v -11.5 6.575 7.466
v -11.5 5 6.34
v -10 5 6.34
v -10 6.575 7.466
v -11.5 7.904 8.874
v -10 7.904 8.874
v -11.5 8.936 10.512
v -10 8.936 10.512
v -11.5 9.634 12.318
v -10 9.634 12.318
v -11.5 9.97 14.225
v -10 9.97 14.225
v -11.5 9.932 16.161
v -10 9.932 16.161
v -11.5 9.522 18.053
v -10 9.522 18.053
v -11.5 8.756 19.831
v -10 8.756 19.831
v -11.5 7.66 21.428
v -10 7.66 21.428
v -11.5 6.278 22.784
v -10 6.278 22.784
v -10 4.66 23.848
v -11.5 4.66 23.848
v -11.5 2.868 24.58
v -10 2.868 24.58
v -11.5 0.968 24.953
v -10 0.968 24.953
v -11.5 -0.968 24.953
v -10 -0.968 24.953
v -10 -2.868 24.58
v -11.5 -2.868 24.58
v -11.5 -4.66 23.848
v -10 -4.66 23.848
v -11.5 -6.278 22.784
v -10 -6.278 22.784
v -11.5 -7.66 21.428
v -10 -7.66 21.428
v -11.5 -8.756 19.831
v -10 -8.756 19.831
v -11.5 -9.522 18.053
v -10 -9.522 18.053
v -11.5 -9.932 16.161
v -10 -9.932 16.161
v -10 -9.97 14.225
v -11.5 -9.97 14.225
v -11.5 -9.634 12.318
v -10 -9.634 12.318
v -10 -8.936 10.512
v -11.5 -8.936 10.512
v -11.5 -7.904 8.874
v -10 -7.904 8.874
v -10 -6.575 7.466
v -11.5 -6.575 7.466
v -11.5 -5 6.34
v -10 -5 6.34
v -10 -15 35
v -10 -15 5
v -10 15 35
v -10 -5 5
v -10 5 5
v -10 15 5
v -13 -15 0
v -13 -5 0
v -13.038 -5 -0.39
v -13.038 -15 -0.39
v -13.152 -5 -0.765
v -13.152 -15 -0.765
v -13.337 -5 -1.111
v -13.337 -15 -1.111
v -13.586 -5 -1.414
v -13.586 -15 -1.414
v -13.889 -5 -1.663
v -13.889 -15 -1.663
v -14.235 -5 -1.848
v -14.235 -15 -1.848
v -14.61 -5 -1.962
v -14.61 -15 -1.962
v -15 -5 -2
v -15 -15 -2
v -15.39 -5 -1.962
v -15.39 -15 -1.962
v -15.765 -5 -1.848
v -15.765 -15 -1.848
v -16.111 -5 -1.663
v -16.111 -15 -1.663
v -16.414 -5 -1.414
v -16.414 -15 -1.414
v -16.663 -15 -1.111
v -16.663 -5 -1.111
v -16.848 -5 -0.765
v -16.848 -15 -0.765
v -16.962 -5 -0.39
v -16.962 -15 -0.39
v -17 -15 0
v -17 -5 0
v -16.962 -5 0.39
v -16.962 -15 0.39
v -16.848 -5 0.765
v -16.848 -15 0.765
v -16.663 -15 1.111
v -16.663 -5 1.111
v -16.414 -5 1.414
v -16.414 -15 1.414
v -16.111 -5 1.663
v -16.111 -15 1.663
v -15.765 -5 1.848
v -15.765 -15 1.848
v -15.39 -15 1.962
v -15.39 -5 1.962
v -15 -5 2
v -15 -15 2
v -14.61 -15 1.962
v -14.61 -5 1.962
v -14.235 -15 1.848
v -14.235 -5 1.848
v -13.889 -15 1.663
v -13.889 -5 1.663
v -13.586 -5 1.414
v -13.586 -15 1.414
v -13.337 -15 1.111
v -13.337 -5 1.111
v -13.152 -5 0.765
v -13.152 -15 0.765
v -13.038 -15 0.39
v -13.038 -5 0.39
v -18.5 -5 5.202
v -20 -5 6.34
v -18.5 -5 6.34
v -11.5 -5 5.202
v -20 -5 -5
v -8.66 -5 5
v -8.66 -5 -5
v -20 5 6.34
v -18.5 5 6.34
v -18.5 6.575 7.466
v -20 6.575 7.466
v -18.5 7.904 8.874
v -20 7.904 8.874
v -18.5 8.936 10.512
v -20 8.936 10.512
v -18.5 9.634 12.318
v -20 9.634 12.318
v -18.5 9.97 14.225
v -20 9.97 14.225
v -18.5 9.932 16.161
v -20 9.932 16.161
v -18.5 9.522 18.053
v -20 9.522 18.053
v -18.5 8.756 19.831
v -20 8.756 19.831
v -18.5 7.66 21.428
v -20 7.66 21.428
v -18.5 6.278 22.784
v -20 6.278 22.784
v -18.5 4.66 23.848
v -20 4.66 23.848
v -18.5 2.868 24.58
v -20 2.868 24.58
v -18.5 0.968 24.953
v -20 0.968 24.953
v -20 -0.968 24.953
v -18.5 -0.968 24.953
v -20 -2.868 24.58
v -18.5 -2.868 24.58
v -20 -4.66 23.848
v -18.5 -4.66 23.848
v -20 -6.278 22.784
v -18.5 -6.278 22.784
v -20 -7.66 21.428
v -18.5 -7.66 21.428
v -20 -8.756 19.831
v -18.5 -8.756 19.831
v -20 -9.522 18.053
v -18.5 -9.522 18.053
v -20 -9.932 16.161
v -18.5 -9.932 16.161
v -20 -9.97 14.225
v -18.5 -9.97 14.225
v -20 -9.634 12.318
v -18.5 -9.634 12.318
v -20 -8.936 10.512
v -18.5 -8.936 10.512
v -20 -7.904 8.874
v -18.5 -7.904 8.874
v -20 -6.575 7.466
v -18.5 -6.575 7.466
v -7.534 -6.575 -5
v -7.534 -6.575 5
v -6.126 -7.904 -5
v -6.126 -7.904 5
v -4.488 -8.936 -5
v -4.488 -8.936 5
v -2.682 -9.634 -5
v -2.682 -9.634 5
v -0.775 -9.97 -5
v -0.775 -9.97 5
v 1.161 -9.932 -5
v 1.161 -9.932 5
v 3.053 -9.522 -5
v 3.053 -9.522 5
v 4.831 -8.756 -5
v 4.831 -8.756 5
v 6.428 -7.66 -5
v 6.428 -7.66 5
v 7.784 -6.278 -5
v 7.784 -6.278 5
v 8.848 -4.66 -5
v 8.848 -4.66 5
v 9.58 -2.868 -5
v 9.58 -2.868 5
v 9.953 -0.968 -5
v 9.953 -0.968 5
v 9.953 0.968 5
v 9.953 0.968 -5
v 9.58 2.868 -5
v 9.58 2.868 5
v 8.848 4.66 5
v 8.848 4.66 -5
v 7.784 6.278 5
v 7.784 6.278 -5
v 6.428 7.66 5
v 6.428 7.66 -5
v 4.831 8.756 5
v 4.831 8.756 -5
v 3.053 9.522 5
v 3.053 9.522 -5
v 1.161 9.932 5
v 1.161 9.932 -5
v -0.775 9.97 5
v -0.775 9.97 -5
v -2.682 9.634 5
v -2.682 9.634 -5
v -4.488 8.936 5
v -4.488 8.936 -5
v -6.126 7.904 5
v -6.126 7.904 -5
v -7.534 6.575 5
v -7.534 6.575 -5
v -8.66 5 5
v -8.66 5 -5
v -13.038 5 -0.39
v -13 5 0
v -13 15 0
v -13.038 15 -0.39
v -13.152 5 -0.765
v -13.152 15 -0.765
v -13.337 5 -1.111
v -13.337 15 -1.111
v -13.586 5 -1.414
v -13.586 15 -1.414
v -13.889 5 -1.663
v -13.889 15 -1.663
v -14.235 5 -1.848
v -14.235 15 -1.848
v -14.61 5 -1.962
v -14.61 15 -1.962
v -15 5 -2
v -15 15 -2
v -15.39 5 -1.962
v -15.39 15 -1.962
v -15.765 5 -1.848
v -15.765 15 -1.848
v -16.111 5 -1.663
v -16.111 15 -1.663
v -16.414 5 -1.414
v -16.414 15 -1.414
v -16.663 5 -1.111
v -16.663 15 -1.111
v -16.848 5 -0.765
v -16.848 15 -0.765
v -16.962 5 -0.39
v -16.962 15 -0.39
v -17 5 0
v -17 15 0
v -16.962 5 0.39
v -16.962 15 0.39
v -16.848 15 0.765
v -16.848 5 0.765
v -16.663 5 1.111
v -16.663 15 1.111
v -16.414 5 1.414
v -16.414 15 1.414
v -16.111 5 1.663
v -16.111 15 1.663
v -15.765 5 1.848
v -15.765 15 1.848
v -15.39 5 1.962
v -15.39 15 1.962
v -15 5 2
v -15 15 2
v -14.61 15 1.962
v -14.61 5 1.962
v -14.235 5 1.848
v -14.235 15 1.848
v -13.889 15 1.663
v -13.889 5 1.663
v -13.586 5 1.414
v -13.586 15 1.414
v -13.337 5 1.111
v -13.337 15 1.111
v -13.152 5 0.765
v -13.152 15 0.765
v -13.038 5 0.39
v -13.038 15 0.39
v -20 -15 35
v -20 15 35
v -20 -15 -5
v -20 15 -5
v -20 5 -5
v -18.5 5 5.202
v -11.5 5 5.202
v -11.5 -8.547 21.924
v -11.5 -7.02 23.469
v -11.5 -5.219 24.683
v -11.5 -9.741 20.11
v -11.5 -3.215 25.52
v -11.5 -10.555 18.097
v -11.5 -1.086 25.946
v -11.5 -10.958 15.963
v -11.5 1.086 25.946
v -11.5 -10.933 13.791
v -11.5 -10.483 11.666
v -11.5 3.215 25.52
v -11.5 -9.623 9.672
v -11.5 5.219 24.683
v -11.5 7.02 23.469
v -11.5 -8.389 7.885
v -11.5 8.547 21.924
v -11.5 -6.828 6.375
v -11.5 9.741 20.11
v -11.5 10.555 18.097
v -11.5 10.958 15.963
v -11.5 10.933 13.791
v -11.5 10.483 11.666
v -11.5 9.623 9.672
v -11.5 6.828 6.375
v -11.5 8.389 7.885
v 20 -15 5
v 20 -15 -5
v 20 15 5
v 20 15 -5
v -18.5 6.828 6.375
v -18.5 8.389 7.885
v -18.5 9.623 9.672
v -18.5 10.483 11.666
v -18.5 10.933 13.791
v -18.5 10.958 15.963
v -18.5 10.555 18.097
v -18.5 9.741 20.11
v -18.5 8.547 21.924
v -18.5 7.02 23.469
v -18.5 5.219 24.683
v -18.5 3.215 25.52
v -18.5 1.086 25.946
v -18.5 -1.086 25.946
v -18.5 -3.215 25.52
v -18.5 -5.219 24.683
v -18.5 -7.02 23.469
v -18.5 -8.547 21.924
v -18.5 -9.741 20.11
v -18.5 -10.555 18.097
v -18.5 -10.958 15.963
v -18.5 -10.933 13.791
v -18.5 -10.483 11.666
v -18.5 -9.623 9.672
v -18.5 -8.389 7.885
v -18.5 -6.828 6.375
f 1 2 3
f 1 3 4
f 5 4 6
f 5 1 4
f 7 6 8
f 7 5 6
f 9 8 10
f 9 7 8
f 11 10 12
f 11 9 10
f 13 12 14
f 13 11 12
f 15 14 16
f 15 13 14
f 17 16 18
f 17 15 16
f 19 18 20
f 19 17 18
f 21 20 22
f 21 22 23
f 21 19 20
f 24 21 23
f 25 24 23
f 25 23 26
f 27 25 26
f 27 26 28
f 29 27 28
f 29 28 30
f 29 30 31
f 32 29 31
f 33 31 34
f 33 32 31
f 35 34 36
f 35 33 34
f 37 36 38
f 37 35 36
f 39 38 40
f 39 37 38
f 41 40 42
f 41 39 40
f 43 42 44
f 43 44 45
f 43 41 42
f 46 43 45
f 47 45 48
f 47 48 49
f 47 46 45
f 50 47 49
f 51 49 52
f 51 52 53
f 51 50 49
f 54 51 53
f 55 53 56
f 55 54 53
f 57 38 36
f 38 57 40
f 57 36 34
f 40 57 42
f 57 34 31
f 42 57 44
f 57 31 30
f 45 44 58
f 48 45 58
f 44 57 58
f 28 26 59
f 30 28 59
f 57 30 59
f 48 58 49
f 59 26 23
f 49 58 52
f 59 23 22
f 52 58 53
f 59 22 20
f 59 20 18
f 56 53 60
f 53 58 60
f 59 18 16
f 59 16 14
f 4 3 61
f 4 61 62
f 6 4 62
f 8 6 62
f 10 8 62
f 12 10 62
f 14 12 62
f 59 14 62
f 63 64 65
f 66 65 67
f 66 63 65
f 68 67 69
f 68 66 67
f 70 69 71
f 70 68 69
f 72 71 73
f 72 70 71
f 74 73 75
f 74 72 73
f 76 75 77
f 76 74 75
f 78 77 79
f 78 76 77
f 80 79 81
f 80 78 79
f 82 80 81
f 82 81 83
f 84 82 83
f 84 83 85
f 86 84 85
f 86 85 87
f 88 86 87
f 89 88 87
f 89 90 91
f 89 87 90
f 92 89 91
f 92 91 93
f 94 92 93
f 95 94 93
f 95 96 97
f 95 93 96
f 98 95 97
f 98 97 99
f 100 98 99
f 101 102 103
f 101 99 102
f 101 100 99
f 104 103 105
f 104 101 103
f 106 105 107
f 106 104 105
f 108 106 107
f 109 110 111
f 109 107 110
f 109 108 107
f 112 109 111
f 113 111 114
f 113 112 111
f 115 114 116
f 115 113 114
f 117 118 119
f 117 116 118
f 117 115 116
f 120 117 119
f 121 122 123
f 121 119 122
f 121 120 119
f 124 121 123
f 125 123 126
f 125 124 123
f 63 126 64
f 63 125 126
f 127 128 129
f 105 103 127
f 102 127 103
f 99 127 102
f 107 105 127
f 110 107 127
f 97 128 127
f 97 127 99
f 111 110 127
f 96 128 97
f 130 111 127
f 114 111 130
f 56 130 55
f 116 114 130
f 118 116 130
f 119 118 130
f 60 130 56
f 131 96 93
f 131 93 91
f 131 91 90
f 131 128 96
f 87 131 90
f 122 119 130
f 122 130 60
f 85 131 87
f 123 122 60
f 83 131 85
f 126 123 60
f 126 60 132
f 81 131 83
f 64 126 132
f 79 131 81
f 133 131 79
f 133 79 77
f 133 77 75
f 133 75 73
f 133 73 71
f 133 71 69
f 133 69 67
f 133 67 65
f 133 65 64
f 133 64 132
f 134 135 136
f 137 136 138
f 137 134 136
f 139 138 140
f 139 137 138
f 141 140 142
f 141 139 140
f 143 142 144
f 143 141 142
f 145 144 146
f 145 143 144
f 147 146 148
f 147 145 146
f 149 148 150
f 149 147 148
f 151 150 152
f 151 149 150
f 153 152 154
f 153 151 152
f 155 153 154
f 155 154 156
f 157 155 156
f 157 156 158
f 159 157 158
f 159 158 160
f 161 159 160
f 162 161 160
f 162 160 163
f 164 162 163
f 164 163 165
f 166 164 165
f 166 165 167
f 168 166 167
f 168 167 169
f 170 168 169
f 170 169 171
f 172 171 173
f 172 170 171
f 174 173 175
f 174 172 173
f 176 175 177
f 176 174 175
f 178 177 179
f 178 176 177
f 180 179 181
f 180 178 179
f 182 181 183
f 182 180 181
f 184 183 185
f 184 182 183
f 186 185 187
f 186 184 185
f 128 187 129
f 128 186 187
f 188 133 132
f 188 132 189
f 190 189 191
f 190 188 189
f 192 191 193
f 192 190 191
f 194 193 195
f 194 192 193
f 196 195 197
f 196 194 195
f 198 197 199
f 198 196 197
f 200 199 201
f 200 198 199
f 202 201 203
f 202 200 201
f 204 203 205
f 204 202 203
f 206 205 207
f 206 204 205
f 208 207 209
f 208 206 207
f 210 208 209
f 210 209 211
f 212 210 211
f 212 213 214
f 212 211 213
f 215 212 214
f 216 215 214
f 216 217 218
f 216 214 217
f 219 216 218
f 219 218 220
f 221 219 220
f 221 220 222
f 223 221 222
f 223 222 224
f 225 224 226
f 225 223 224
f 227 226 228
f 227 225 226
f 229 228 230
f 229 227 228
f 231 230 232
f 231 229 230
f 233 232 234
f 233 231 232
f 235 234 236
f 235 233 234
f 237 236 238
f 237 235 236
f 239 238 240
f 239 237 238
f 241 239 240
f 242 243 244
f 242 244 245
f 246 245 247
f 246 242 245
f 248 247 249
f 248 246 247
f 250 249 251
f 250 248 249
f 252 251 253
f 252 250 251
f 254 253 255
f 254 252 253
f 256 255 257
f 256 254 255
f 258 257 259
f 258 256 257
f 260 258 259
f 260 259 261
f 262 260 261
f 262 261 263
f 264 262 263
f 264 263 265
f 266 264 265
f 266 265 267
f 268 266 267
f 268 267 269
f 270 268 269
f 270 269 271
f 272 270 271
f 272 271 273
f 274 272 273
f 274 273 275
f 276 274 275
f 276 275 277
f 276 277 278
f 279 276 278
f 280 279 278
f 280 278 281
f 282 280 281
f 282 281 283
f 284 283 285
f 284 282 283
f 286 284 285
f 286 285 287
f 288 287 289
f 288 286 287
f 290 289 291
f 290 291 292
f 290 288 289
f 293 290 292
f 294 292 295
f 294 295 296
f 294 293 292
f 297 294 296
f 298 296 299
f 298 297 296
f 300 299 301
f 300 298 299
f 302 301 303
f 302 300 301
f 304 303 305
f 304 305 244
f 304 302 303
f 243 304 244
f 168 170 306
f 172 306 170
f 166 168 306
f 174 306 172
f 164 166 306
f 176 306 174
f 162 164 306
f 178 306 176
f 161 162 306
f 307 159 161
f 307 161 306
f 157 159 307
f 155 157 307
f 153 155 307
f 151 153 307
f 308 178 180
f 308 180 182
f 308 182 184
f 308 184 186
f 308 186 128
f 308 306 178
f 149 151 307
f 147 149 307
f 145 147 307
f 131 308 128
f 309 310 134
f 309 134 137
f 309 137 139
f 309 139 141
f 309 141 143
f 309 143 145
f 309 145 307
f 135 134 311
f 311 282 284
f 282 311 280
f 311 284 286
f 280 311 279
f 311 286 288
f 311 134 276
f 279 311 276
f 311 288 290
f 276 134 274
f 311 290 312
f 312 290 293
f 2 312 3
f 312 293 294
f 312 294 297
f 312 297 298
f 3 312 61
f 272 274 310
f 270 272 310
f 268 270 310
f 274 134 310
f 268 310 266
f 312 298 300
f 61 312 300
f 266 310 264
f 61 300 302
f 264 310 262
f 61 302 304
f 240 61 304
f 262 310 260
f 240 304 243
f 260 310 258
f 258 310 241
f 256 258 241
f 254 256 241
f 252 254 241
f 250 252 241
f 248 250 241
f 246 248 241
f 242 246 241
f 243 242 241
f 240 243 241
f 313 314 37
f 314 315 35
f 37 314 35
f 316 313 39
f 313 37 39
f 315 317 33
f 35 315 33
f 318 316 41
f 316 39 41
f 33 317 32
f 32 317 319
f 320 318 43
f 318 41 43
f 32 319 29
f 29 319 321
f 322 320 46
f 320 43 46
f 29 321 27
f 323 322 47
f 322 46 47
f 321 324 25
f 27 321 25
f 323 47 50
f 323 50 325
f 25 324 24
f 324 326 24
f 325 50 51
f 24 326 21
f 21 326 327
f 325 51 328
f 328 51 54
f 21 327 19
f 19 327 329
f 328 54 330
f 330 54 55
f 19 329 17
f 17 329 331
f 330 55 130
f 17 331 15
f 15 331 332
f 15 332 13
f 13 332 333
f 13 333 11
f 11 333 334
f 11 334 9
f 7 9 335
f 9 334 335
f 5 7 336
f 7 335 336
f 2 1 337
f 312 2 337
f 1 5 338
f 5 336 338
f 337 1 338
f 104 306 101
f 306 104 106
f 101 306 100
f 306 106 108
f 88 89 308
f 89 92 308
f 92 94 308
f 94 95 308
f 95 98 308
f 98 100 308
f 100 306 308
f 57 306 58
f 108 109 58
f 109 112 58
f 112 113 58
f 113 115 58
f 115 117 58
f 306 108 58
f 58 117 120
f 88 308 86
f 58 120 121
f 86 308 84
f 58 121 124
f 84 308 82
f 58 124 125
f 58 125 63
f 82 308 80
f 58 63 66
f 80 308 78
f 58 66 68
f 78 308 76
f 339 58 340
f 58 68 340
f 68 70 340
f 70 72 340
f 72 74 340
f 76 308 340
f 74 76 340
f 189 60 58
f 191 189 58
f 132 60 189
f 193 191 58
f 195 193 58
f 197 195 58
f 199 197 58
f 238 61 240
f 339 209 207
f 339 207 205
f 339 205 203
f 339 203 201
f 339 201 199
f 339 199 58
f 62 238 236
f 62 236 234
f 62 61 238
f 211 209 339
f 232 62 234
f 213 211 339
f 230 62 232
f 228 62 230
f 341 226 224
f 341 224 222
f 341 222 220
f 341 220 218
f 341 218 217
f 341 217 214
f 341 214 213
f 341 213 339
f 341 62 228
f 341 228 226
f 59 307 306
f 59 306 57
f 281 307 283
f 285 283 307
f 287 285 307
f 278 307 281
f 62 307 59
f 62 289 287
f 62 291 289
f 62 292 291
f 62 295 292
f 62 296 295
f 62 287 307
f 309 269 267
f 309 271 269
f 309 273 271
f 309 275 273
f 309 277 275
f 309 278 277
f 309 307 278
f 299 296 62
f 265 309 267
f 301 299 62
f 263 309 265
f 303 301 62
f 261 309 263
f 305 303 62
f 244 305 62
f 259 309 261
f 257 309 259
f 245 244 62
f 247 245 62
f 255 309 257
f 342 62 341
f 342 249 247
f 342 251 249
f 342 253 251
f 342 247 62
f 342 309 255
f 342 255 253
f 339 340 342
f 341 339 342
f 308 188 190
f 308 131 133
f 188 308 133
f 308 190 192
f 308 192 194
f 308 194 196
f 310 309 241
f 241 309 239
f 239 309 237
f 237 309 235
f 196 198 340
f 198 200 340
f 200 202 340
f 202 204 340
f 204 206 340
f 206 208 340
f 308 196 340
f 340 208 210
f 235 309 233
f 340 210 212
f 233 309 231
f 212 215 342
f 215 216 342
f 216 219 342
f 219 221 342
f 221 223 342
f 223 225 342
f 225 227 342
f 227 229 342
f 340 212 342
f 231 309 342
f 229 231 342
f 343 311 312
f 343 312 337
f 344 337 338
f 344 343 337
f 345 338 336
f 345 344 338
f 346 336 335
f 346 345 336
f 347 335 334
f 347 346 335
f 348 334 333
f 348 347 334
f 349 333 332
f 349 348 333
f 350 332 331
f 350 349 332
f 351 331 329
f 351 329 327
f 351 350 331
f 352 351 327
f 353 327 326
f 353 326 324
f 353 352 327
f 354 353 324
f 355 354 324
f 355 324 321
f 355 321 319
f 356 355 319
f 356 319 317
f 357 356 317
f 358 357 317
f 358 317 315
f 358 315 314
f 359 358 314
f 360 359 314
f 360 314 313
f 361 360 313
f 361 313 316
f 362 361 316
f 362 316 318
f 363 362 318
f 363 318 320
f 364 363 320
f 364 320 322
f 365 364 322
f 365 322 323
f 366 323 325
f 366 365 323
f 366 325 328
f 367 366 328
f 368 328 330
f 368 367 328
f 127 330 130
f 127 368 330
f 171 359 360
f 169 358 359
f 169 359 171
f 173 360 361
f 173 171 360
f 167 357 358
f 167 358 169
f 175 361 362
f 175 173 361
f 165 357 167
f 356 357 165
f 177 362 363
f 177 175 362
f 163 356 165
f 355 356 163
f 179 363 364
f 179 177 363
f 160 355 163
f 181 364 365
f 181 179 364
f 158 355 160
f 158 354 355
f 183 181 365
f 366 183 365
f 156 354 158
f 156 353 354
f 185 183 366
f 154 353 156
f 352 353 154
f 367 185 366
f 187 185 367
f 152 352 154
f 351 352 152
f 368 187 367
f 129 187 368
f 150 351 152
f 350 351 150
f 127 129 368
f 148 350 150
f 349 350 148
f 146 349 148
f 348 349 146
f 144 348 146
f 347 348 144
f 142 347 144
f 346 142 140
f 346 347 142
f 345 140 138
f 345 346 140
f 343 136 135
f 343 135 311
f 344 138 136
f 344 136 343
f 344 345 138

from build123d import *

# Parameters (mm, degrees)
CYLINDER_R              = 10
CYLINDER_DEPTH          = 10
CYLINDER001_R           = 2
CYLINDER001_DEPTH       = 30
CYLINDER001_ROLL_ANGLE  = -90
CYLINDER002_R           = 11
CYLINDER002_DEPTH       = 7
CYLINDER002_PITCH_ANGLE = 90
CYLINDER003_R           = 10
CYLINDER003_DEPTH       = 10
CYLINDER003_PITCH_ANGLE = 90
BOX001_W                = 15
BOX001_H                = 10
BOX001_DEPTH            = 15
BOX002_W                = 10
BOX002_H                = 30
BOX002_DEPTH            = 40
BOX_W                   = 40
BOX_H                   = 30
BOX_DEPTH               = 10


with BuildPart() as cylinder:
    # Cylinder → Cylinder (new body)
    with BuildSketch(Plane.XY.offset(-5)):
        Circle(CYLINDER_R)
    extrude(amount=CYLINDER_DEPTH)


with BuildPart() as cylinder001:
    # Cylinder001 → Cylinder001 (new body)
    with BuildSketch(Plane.XY):
        Circle(CYLINDER001_R)
    extrude(amount=CYLINDER001_DEPTH)


with BuildPart() as cylinder001_1:
    # Cylinder001 roll: moved
    add(cylinder001.part.rotate(Axis((0, 0, 0), (1, 0, 0)), CYLINDER001_ROLL_ANGLE))


with BuildPart() as cylinder001_2:
    # Cylinder001 placement: moved
    add(cylinder001_1.part.moved(Location((-15, -15, 0))))


with BuildPart() as bearing_cylinder:
    # Cylinder002 → Cylinder002 (new body)
    with BuildSketch(Plane.XY):
        Circle(CYLINDER002_R)
    extrude(amount=CYLINDER002_DEPTH)


with BuildPart() as bearing_cylinder_1:
    # Cylinder002 pitch: moved
    add(bearing_cylinder.part.rotate(Axis((0, 0, 0), (0, 1, 0)), CYLINDER002_PITCH_ANGLE))


with BuildPart() as bearing_cylinder_2:
    # Cylinder002 placement: moved
    add(bearing_cylinder_1.part.moved(Location((-18.5, 0, 15))))


with BuildPart() as bearing_cylinder_outer:
    # Cylinder003 → Cylinder003 (new body)
    with BuildSketch(Plane.XY):
        Circle(CYLINDER003_R)
    extrude(amount=CYLINDER003_DEPTH)


with BuildPart() as bearing_cylinder_outer_1:
    # Cylinder003 pitch: moved
    add(bearing_cylinder_outer.part.rotate(Axis((0, 0, 0), (0, 1, 0)), CYLINDER003_PITCH_ANGLE))


with BuildPart() as bearing_cylinder_outer_2:
    # Cylinder003 placement: moved
    add(bearing_cylinder_outer_1.part.moved(Location((-20, 0, 15))))


with BuildPart() as negative_fusion:
    # Box001 → Box001 (new body)
    with BuildSketch(Plane(origin=(-20, -5, -5), x_dir=(1, 0, 0), z_dir=(0, 0, 1))):
        with Locations((7.5, 5)):
            Rectangle(BOX001_W, BOX001_H)
    extrude(amount=BOX001_DEPTH)

    # Fusion: union Cylinder, Cylinder001, Bearing Cylinder, Bearing Cylinder Outer
    add(cylinder.part)
    add(cylinder001_2.part)
    add(bearing_cylinder_2.part)
    add(bearing_cylinder_outer_2.part)


with BuildPart() as cube002:
    # Box002 → Box002 (new body)
    with BuildSketch(Plane(origin=(-20, -15, -5), x_dir=(1, 0, 0), z_dir=(0, 0, 1))):
        with Locations((5, 15)):
            Rectangle(BOX002_W, BOX002_H)
    extrude(amount=BOX002_DEPTH)


with BuildPart() as cut:
    # Box → Box (new body)
    with BuildSketch(Plane(origin=(-20, -15, -5), x_dir=(1, 0, 0), z_dir=(0, 0, 1))):
        with Locations((20, 15)):
            Rectangle(BOX_W, BOX_H)
    extrude(amount=BOX_DEPTH)

    # Fusion001: union Cube002
    add(cube002.part)

    # Cut: cut Negative Fusion
    add(negative_fusion.part, mode=Mode.SUBTRACT)


solid = cut.part
